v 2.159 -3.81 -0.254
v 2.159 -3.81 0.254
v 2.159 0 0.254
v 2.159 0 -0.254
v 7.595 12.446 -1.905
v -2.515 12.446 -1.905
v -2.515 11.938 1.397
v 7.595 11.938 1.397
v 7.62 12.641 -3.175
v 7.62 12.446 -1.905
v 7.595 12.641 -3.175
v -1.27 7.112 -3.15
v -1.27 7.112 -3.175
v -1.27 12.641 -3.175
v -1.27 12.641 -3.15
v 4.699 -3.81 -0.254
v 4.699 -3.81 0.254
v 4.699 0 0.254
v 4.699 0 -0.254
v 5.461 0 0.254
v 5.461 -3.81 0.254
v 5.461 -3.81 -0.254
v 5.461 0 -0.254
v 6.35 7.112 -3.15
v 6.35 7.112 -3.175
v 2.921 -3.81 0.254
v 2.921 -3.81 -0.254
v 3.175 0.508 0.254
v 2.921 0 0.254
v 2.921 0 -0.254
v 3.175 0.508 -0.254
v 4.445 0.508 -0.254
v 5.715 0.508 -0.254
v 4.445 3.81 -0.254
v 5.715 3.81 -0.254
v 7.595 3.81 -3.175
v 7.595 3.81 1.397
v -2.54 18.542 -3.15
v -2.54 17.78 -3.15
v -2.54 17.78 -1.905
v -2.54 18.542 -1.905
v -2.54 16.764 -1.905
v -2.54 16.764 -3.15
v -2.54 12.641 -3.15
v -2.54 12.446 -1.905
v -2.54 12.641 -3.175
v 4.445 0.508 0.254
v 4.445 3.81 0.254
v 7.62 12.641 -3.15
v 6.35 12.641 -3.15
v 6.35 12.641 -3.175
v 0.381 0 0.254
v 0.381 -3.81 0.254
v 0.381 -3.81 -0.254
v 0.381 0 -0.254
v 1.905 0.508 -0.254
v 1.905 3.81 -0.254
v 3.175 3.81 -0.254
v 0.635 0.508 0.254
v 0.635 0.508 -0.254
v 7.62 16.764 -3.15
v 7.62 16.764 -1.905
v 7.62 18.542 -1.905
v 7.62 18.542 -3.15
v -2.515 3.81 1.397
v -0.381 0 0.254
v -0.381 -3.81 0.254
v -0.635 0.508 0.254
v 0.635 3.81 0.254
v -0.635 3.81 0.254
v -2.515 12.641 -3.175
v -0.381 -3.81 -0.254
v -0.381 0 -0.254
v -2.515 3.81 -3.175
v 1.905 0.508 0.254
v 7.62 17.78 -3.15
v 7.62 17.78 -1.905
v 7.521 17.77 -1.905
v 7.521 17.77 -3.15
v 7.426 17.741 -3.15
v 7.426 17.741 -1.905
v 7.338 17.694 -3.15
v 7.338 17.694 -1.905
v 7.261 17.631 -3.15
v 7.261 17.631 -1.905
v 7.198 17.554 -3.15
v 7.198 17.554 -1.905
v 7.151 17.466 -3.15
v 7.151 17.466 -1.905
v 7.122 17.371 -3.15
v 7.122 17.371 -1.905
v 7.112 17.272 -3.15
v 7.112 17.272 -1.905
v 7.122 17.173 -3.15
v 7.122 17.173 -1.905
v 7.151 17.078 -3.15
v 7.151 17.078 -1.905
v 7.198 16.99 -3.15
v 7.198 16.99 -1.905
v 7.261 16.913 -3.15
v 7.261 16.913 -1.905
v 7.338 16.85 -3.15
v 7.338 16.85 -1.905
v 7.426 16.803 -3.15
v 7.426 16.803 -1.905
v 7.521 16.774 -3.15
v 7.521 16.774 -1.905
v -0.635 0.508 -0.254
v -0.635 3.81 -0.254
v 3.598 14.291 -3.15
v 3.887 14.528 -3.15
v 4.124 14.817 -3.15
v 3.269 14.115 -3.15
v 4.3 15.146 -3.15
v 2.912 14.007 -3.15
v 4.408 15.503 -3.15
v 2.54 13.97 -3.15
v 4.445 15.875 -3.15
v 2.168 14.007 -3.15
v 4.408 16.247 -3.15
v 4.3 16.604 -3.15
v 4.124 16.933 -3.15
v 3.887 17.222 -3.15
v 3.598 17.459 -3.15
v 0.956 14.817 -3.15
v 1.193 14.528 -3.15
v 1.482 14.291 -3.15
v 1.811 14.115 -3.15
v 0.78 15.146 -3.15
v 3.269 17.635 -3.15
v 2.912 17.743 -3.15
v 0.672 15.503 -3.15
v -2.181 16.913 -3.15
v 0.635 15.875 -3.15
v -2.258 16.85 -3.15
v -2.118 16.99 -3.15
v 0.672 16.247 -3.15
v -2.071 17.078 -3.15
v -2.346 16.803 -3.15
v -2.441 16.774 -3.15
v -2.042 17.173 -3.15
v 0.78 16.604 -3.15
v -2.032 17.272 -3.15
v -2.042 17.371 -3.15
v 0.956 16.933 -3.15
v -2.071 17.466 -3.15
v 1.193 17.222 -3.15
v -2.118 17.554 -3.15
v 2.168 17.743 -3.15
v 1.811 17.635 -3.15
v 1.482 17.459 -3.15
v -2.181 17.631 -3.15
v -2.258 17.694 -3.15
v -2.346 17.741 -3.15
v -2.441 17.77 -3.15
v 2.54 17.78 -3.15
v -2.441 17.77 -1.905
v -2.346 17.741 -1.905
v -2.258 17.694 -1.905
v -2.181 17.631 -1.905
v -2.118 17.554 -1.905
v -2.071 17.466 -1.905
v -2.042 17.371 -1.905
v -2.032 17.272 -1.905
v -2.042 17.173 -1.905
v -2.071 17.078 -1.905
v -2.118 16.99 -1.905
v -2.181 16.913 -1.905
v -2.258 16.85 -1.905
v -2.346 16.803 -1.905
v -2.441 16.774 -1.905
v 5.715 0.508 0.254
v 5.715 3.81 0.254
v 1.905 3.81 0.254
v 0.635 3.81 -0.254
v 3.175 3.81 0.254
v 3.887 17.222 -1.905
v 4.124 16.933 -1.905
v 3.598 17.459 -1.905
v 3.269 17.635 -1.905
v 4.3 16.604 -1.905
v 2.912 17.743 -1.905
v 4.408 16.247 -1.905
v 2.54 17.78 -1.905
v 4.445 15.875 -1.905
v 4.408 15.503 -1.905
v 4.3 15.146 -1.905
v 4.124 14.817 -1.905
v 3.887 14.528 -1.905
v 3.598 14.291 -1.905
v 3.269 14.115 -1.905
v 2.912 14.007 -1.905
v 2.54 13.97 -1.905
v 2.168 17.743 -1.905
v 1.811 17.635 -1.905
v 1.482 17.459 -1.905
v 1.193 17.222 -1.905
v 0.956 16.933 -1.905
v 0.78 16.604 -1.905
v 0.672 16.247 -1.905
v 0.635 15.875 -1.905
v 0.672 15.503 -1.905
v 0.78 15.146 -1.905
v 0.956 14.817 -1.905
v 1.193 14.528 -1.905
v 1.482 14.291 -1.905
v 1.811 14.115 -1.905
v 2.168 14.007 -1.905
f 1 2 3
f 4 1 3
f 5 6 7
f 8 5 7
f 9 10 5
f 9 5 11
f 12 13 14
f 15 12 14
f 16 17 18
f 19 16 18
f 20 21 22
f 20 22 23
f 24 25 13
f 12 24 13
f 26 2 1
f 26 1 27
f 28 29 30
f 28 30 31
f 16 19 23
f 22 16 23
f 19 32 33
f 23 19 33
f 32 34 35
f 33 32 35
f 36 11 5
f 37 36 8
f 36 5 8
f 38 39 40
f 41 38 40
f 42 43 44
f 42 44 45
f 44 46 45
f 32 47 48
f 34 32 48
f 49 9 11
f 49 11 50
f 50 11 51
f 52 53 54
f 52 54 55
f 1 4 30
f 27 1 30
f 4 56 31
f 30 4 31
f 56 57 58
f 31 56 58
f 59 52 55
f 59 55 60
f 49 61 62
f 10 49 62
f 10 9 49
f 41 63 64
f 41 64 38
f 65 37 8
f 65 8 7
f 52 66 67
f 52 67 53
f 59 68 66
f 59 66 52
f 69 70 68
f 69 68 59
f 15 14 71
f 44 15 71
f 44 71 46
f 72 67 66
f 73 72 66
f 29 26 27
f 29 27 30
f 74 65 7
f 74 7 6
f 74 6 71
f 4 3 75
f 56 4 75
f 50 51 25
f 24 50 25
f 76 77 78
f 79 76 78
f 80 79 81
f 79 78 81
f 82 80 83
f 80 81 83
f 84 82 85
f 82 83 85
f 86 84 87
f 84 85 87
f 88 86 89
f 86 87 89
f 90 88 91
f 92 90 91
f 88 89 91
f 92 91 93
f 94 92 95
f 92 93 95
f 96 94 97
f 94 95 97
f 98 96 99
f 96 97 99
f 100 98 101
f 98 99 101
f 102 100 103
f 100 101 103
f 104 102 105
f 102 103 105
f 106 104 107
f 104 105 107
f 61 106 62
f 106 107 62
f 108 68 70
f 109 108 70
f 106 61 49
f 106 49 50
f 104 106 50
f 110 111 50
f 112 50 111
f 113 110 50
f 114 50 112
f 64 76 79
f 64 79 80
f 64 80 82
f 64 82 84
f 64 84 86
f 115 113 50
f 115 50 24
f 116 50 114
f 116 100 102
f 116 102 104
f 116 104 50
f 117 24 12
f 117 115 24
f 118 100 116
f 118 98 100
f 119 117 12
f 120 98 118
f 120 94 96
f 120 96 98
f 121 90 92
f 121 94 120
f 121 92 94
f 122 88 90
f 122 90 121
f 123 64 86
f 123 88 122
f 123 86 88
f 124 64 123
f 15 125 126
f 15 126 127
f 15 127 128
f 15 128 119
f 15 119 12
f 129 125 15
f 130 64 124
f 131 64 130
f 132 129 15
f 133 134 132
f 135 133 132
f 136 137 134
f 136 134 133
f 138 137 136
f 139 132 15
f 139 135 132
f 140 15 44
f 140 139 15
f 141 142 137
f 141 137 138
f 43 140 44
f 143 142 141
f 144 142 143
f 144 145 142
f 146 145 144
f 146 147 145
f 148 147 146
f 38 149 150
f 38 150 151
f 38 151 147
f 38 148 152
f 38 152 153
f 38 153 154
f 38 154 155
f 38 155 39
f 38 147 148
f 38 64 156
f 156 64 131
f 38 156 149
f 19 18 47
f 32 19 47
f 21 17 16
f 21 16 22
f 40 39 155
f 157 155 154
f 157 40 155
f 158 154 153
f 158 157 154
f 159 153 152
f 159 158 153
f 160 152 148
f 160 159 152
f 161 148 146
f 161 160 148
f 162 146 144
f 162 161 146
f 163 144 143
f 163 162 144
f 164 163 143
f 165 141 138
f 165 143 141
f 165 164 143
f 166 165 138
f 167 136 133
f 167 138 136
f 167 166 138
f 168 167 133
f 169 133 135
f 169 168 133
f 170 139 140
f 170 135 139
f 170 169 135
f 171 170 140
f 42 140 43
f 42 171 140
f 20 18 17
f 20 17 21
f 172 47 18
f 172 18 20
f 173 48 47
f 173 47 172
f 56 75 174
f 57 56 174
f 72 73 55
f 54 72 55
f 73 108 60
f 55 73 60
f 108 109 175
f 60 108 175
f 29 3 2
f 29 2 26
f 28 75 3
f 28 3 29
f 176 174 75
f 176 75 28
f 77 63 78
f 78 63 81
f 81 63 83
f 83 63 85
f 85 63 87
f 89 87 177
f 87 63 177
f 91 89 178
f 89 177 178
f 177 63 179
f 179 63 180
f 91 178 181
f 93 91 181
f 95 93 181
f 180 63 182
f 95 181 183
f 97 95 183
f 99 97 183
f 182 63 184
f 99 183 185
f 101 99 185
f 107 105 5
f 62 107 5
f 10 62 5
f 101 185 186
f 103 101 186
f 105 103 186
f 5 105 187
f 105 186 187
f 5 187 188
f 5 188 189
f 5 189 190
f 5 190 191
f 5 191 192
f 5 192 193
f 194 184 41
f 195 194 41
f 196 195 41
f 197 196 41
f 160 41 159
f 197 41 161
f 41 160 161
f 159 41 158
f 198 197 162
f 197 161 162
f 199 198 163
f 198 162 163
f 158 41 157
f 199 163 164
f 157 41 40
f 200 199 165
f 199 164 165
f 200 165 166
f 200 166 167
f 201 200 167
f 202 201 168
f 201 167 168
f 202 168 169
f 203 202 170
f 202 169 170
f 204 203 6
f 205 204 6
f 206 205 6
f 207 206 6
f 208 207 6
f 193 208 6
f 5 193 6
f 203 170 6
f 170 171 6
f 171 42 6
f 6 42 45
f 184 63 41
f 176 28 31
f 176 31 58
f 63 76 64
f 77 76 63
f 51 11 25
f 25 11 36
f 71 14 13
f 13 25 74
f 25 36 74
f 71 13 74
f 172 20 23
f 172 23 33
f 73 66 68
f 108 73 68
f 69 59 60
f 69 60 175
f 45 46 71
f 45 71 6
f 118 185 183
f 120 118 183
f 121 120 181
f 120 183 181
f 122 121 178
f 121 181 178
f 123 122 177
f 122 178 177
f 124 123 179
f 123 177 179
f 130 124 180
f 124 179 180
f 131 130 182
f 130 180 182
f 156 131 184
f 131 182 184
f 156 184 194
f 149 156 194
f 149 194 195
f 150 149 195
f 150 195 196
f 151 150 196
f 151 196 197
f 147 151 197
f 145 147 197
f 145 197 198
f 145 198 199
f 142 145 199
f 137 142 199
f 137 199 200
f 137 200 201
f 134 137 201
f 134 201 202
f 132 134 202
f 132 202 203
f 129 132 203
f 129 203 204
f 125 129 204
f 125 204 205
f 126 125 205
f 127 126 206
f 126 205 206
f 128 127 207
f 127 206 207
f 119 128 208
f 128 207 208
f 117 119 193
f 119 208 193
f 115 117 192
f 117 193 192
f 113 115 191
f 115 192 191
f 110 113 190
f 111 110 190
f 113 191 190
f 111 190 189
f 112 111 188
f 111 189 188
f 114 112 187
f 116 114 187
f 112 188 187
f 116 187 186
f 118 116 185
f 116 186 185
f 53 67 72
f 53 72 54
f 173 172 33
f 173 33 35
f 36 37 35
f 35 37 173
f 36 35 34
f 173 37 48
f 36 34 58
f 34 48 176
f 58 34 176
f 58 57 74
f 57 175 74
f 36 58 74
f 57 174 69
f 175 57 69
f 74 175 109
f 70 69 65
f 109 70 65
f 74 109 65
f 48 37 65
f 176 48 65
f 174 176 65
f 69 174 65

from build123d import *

# Parameters (mm, degrees)
SKETCH2_W                = 10.16
SKETCH2_H                = 4.572
BASE_EXTRUDE_DEPTH       = 14.732
CUT_EXTRUDE1_DEPTH       = 1
CUT_EXTRUDE1_DEPTH_BACK  = 11.16
SKETCH4_R                = 1.905
CUT_EXTRUDE2_DEPTH       = 14.732
CUT_EXTRUDE4_DEPTH       = 0.0254
CUT_EXTRUDE5_DEPTH       = 0.0254
CUT_EXTRUDE6_DEPTH       = 0.0254
CUT_EXTRUDE7_DEPTH       = 2.54
SKETCH9_W                = 1.27
SKETCH9_H                = 7.62
BOSS_EXTRUDE_THIN1_DEPTH = 0.254
CUT_EXTRUDE8_DEPTH       = 1.27
LPATTERN1_COUNT          = 3
LPATTERN1_PITCH          = 2.54


with BuildPart() as part:
    # Sketch2 → Base-Extrude (new body)
    with BuildSketch(Plane(origin=(0, 3.81, 0), x_dir=(-1, 0, 0), z_dir=(0, 1, 0))):
        with Locations((-2.54, -0.889)):
            Rectangle(SKETCH2_W, SKETCH2_H)
    extrude(amount=BASE_EXTRUDE_DEPTH)

    # Sketch3 → Cut-Extrude1 (cut, two sides)
    with BuildSketch(Plane.ZY.offset(2.54)) as cut_extrude1_sk:
        Polygon((-1.905, 18.542), (-1.905, 12.446), (1.397, 11.938), (1.397, 18.542), align=None)
    extrude(amount=CUT_EXTRUDE1_DEPTH, mode=Mode.SUBTRACT)
    extrude(cut_extrude1_sk.sketch, amount=-CUT_EXTRUDE1_DEPTH_BACK, mode=Mode.SUBTRACT)

    # Sketch4 → Cut-Extrude2 (cut)
    with BuildSketch(Plane.XY.offset(-1.905)):
        with Locations((2.54, 15.875)):
            Circle(SKETCH4_R)
    extrude(amount=-CUT_EXTRUDE2_DEPTH, mode=Mode.SUBTRACT)

    # Sketch5 → Cut-Extrude4 (cut)
    with BuildSketch(Plane.ZY.offset(2.54)):
        Polygon((-3.175, 12.641384615), (1.397, 11.938), (1.397, 3.81), (-3.175, 3.81), align=None)
    extrude(amount=-CUT_EXTRUDE4_DEPTH, mode=Mode.SUBTRACT)

    # Sketch6 → Cut-Extrude5 (cut)
    with BuildSketch(Plane(origin=(7.62, 0, 0), x_dir=(0, 0, -1), z_dir=(1, 0, 0))):
        Polygon((-1.397, 11.938), (3.175, 12.641384615), (3.175, 3.81), (-1.397, 3.81), align=None)
    extrude(amount=-CUT_EXTRUDE5_DEPTH, mode=Mode.SUBTRACT)

    # Sketch7 → Cut-Extrude6 (cut)
    with BuildSketch(Plane(origin=(0, 0, -3.175), x_dir=(-1, 0, 0), z_dir=(0, 0, -1))):
        Polygon((-7.62, 18.542), (-7.62, 12.641384615), (-6.35, 12.641384615), (-6.35, 7.112), (1.27, 7.112), (1.27, 12.641384615), (2.54, 12.641384615), (2.54, 18.542), align=None)
    extrude(amount=-CUT_EXTRUDE6_DEPTH, mode=Mode.SUBTRACT)

    # Sketch8 → Cut-Extrude7 (cut)
    with BuildSketch(Plane.XY.offset(-1.905)):
        with BuildLine():
            Line((7.62, 16.764), (7.62, 17.78))
            ThreePointArc((7.62, 17.78), (7.112, 17.272), (7.62, 16.764))
        make_face()
        with BuildLine():
            Line((-2.54, 16.764), (-2.54, 17.78))
            ThreePointArc((-2.54, 17.78), (-2.032, 17.272), (-2.54, 16.764))
        make_face()
    extrude(amount=-CUT_EXTRUDE7_DEPTH, mode=Mode.SUBTRACT)

    # Sketch9 → Boss-Extrude-Thin1 (add, symmetric)
    with BuildSketch(Plane.XY):
        Rectangle(SKETCH9_W, SKETCH9_H)
    boss_extrude_thin1 = extrude(amount=BOSS_EXTRUDE_THIN1_DEPTH, both=True)

    # Sketch11 → Cut-Extrude8 (cut)
    with BuildSketch(Plane.XY.offset(0.254)):
        Polygon((0.635, 0.508), (0.635, -3.81), (0.381, -3.81), (0.381, 0), align=None)
        Polygon((-0.635, 0.508), (-0.635, -3.81), (-0.381, -3.81), (-0.381, 0), align=None)
    cut_extrude8 = extrude(amount=-CUT_EXTRUDE8_DEPTH, mode=Mode.SUBTRACT)

    # LPattern1: Boss-Extrude-Thin1, Cut-Extrude8 ×3
    with Locations(*[(i * LPATTERN1_PITCH, 0, 0) for i in range(1, LPATTERN1_COUNT)]):
        add(boss_extrude_thin1)
        add(cut_extrude8, mode=Mode.SUBTRACT)


solid = part.part
